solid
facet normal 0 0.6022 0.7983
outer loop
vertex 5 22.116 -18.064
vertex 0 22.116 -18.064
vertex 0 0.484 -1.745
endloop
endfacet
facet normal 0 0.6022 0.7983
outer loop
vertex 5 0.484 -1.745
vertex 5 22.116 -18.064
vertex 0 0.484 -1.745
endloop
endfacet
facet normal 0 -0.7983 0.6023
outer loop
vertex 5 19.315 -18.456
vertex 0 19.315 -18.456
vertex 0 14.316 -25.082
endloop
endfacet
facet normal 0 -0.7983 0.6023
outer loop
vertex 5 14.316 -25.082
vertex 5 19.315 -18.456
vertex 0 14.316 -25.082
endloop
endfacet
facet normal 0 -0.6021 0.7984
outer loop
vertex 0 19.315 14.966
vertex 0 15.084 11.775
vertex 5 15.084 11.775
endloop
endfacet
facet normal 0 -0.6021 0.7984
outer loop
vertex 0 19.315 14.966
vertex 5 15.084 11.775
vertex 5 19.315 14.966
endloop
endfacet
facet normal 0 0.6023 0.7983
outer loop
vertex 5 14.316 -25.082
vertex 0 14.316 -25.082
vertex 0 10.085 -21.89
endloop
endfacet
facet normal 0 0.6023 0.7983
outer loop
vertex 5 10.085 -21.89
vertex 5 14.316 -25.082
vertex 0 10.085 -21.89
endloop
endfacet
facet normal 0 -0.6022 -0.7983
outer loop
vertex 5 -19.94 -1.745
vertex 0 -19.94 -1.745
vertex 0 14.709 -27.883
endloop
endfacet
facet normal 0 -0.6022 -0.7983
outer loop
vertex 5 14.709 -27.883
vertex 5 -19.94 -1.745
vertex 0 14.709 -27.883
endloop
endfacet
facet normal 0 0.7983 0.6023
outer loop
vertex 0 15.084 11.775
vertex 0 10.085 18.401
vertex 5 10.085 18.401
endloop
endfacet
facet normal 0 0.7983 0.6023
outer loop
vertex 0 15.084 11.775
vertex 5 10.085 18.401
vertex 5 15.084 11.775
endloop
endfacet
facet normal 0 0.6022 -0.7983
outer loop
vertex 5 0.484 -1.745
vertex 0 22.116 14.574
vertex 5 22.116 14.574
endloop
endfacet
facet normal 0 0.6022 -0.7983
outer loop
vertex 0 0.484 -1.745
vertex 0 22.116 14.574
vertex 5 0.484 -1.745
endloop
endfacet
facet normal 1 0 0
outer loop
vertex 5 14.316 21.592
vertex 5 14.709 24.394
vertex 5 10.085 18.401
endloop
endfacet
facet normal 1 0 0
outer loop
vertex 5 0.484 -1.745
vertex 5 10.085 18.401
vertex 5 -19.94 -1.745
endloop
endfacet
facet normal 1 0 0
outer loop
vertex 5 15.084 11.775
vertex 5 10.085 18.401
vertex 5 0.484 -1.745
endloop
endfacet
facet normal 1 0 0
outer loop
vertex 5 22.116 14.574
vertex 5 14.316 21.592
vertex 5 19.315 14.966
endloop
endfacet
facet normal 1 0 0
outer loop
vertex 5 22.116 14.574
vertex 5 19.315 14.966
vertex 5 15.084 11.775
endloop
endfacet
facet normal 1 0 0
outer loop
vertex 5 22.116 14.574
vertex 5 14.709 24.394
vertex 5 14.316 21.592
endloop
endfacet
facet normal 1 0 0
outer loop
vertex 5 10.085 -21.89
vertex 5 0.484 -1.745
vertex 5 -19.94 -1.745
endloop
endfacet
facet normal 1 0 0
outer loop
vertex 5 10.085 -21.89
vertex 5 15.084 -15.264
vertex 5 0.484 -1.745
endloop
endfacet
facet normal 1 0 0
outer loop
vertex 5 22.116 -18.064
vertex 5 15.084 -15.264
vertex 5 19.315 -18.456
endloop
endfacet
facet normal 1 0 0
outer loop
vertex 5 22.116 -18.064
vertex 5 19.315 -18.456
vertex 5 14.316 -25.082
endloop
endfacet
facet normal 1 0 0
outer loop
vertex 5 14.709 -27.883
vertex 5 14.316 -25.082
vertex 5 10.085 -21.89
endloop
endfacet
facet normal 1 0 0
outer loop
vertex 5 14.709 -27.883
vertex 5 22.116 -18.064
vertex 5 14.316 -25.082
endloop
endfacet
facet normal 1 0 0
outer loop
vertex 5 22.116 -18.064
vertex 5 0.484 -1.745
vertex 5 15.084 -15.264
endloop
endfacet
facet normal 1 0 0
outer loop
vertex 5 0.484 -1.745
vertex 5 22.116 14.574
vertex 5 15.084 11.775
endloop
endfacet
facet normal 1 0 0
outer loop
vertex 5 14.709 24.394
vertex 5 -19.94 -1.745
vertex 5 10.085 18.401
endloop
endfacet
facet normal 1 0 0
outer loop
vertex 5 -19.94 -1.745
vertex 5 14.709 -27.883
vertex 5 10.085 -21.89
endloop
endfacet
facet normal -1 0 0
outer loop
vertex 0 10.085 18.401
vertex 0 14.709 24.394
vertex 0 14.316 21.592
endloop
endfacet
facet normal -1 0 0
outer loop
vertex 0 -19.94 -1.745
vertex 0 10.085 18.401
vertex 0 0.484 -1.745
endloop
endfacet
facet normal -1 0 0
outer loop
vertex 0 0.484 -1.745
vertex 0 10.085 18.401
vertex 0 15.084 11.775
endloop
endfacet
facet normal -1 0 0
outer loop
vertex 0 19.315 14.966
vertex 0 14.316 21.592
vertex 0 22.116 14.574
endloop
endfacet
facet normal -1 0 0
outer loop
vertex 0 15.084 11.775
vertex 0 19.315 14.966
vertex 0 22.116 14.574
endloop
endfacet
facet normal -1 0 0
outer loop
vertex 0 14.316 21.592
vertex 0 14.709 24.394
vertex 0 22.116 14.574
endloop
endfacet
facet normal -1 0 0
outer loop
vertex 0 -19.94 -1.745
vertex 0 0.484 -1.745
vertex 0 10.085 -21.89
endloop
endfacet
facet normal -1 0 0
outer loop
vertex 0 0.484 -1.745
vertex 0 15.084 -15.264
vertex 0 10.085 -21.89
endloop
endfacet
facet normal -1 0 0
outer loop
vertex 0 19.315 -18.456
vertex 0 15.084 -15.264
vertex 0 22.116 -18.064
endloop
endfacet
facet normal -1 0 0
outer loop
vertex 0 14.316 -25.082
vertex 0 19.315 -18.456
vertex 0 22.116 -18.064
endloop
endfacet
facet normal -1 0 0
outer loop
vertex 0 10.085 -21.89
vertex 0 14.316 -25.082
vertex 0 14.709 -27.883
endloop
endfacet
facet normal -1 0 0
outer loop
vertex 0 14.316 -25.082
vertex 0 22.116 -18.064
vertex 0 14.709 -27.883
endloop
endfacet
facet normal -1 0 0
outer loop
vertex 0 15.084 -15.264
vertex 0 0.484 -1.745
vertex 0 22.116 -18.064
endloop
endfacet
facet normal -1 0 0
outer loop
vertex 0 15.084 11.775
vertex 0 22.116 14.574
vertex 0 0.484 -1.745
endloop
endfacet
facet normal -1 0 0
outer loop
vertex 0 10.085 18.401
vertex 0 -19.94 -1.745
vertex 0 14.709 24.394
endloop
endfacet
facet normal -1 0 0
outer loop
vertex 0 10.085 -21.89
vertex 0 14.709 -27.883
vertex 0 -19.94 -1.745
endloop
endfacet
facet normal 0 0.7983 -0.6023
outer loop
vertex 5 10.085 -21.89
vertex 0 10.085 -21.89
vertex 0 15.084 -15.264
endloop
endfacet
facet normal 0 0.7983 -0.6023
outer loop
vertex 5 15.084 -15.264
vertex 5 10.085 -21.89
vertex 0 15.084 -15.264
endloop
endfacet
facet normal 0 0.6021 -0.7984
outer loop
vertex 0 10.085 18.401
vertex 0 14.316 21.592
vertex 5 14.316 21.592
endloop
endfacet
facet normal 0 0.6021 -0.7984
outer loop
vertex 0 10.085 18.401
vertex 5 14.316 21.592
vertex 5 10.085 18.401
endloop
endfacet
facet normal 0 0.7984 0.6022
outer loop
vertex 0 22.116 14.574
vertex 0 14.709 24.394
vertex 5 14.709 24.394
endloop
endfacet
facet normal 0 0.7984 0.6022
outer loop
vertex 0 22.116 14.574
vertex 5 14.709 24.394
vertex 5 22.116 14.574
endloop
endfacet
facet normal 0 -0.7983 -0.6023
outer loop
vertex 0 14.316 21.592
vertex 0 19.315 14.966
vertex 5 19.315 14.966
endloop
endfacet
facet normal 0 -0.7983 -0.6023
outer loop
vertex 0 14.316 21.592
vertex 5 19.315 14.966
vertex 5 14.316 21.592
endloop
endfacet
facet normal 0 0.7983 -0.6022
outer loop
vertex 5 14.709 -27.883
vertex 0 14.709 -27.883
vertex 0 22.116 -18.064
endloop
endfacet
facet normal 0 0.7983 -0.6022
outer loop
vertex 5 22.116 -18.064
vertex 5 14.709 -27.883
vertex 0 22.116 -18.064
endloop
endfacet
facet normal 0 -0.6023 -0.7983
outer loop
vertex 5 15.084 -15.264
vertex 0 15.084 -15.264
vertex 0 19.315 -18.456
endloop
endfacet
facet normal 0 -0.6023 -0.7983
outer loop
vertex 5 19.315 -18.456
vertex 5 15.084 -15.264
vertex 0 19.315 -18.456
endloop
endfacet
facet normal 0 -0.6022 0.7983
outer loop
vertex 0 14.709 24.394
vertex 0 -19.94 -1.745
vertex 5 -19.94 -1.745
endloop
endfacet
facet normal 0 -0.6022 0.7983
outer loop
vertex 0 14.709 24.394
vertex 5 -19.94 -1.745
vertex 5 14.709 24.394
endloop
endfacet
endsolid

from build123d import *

# Parameters (mm, degrees)
EXTRUDE_1_DEPTH     = 5
CUT_EXTRUDE_1_DEPTH = 5


with BuildPart() as part:
    # 草图3 → 凸台-拉伸1 (new body)
    with BuildSketch(Plane(origin=(0, 0, 0), x_dir=(0, 0, -1), z_dir=(1, 0, 0))):
        Polygon((-14.574209951, 22.116049871), (1.744837218, 0.483518594), (1.744837218, -19.94046656), (-24.39354953, 14.708582677), align=None)
    extrude(amount=EXTRUDE_1_DEPTH)

    # 草图2 → 切除-拉伸1 (cut)
    with BuildSketch(Plane(origin=(0, 0, 0), x_dir=(0, 0, -1), z_dir=(1, 0, 0))):
        Polygon((-18.40060728, 10.085310763), (-11.774548865, 15.083845536), (-14.966384322, 19.314943078), (-21.592442737, 14.316408305), align=None)
    extrude(amount=CUT_EXTRUDE_1_DEPTH, mode=Mode.SUBTRACT)

    # 镜向1: part across plane


with BuildPart() as part_1:
    add(part.part)
    add(part.part.mirror(Plane(origin=(5, 0.483518594, -1.744837218), x_dir=(1, 0, 0), z_dir=(0, 0, 1))))


solid = part_1.part
